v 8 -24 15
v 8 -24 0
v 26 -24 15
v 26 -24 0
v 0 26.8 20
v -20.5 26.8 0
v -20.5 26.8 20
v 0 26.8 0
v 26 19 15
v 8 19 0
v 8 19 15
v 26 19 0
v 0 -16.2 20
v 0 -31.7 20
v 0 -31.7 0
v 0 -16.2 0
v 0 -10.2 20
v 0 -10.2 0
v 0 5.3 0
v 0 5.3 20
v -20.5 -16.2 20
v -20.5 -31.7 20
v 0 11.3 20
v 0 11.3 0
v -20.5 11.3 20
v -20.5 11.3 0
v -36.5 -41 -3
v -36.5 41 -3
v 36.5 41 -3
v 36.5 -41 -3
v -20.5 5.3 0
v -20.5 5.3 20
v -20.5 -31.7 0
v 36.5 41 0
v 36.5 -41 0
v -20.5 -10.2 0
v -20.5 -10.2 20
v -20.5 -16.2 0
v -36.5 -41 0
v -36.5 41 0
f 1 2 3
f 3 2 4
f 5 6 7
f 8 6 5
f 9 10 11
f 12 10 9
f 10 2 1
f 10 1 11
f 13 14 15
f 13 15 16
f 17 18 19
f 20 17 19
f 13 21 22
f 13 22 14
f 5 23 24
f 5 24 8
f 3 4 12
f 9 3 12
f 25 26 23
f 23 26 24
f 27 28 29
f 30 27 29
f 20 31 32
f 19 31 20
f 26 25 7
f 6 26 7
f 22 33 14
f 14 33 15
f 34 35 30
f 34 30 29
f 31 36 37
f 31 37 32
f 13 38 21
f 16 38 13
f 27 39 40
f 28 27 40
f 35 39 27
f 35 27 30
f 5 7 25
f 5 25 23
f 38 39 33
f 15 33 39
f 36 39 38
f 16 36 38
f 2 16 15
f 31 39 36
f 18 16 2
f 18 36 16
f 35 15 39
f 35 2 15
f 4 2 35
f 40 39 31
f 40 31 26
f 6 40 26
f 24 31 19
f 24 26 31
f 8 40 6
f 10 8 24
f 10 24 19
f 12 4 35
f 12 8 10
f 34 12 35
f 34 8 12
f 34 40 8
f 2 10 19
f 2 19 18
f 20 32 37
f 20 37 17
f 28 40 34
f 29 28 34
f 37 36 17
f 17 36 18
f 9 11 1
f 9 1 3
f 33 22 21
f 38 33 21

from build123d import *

# Parameters (mm, degrees)
F0_W     = 73
F0_H     = 82
F0_W_2   = 20.5
F0_H_2   = 15.5
F0_W_3   = 18
F0_H_3   = 43
F1_DEPTH = 3
F2_DEPTH = 20
F3_DEPTH = 15


with BuildPart() as f1:
    # F0 (on Top) → F1 (new body)
    with BuildSketch(Plane.XY):
        Rectangle(F0_W, F0_H)
        with Locations((-10.25, -23.95)):
            Rectangle(F0_W_2, F0_H_2, mode=Mode.SUBTRACT)
        with Locations((-10.25, -2.45)):
            Rectangle(F0_W_2, F0_H_2, mode=Mode.SUBTRACT)
        with Locations((17, -2.5)):
            Rectangle(F0_W_3, F0_H_3, mode=Mode.SUBTRACT)
        with Locations((-10.25, 19.05)):
            Rectangle(F0_W_2, F0_H_2, mode=Mode.SUBTRACT)
        with Locations((17, -2.5)):
            Rectangle(F0_W_3, F0_H_3)
        with Locations((-10.25, -2.45)):
            Rectangle(F0_W_2, F0_H_2)
        with Locations((-10.25, -23.95)):
            Rectangle(F0_W_2, F0_H_2)
        with Locations((-10.25, 19.05)):
            Rectangle(F0_W_2, F0_H_2)
    extrude(amount=-F1_DEPTH)

    # F0 (on Top) → F2 (join)
    with BuildSketch(Plane.XY):
        with Locations((-10.25, -23.95)):
            Rectangle(F0_W_2, F0_H_2)
        with Locations((-10.25, -2.45)):
            Rectangle(F0_W_2, F0_H_2)
        with Locations((-10.25, 19.05)):
            Rectangle(F0_W_2, F0_H_2)
    extrude(amount=F2_DEPTH)

    # F0 (on Top) → F3 (join)
    with BuildSketch(Plane.XY):
        with Locations((17, -2.5)):
            Rectangle(F0_W_3, F0_H_3)
    extrude(amount=F3_DEPTH)


solid = f1.part
